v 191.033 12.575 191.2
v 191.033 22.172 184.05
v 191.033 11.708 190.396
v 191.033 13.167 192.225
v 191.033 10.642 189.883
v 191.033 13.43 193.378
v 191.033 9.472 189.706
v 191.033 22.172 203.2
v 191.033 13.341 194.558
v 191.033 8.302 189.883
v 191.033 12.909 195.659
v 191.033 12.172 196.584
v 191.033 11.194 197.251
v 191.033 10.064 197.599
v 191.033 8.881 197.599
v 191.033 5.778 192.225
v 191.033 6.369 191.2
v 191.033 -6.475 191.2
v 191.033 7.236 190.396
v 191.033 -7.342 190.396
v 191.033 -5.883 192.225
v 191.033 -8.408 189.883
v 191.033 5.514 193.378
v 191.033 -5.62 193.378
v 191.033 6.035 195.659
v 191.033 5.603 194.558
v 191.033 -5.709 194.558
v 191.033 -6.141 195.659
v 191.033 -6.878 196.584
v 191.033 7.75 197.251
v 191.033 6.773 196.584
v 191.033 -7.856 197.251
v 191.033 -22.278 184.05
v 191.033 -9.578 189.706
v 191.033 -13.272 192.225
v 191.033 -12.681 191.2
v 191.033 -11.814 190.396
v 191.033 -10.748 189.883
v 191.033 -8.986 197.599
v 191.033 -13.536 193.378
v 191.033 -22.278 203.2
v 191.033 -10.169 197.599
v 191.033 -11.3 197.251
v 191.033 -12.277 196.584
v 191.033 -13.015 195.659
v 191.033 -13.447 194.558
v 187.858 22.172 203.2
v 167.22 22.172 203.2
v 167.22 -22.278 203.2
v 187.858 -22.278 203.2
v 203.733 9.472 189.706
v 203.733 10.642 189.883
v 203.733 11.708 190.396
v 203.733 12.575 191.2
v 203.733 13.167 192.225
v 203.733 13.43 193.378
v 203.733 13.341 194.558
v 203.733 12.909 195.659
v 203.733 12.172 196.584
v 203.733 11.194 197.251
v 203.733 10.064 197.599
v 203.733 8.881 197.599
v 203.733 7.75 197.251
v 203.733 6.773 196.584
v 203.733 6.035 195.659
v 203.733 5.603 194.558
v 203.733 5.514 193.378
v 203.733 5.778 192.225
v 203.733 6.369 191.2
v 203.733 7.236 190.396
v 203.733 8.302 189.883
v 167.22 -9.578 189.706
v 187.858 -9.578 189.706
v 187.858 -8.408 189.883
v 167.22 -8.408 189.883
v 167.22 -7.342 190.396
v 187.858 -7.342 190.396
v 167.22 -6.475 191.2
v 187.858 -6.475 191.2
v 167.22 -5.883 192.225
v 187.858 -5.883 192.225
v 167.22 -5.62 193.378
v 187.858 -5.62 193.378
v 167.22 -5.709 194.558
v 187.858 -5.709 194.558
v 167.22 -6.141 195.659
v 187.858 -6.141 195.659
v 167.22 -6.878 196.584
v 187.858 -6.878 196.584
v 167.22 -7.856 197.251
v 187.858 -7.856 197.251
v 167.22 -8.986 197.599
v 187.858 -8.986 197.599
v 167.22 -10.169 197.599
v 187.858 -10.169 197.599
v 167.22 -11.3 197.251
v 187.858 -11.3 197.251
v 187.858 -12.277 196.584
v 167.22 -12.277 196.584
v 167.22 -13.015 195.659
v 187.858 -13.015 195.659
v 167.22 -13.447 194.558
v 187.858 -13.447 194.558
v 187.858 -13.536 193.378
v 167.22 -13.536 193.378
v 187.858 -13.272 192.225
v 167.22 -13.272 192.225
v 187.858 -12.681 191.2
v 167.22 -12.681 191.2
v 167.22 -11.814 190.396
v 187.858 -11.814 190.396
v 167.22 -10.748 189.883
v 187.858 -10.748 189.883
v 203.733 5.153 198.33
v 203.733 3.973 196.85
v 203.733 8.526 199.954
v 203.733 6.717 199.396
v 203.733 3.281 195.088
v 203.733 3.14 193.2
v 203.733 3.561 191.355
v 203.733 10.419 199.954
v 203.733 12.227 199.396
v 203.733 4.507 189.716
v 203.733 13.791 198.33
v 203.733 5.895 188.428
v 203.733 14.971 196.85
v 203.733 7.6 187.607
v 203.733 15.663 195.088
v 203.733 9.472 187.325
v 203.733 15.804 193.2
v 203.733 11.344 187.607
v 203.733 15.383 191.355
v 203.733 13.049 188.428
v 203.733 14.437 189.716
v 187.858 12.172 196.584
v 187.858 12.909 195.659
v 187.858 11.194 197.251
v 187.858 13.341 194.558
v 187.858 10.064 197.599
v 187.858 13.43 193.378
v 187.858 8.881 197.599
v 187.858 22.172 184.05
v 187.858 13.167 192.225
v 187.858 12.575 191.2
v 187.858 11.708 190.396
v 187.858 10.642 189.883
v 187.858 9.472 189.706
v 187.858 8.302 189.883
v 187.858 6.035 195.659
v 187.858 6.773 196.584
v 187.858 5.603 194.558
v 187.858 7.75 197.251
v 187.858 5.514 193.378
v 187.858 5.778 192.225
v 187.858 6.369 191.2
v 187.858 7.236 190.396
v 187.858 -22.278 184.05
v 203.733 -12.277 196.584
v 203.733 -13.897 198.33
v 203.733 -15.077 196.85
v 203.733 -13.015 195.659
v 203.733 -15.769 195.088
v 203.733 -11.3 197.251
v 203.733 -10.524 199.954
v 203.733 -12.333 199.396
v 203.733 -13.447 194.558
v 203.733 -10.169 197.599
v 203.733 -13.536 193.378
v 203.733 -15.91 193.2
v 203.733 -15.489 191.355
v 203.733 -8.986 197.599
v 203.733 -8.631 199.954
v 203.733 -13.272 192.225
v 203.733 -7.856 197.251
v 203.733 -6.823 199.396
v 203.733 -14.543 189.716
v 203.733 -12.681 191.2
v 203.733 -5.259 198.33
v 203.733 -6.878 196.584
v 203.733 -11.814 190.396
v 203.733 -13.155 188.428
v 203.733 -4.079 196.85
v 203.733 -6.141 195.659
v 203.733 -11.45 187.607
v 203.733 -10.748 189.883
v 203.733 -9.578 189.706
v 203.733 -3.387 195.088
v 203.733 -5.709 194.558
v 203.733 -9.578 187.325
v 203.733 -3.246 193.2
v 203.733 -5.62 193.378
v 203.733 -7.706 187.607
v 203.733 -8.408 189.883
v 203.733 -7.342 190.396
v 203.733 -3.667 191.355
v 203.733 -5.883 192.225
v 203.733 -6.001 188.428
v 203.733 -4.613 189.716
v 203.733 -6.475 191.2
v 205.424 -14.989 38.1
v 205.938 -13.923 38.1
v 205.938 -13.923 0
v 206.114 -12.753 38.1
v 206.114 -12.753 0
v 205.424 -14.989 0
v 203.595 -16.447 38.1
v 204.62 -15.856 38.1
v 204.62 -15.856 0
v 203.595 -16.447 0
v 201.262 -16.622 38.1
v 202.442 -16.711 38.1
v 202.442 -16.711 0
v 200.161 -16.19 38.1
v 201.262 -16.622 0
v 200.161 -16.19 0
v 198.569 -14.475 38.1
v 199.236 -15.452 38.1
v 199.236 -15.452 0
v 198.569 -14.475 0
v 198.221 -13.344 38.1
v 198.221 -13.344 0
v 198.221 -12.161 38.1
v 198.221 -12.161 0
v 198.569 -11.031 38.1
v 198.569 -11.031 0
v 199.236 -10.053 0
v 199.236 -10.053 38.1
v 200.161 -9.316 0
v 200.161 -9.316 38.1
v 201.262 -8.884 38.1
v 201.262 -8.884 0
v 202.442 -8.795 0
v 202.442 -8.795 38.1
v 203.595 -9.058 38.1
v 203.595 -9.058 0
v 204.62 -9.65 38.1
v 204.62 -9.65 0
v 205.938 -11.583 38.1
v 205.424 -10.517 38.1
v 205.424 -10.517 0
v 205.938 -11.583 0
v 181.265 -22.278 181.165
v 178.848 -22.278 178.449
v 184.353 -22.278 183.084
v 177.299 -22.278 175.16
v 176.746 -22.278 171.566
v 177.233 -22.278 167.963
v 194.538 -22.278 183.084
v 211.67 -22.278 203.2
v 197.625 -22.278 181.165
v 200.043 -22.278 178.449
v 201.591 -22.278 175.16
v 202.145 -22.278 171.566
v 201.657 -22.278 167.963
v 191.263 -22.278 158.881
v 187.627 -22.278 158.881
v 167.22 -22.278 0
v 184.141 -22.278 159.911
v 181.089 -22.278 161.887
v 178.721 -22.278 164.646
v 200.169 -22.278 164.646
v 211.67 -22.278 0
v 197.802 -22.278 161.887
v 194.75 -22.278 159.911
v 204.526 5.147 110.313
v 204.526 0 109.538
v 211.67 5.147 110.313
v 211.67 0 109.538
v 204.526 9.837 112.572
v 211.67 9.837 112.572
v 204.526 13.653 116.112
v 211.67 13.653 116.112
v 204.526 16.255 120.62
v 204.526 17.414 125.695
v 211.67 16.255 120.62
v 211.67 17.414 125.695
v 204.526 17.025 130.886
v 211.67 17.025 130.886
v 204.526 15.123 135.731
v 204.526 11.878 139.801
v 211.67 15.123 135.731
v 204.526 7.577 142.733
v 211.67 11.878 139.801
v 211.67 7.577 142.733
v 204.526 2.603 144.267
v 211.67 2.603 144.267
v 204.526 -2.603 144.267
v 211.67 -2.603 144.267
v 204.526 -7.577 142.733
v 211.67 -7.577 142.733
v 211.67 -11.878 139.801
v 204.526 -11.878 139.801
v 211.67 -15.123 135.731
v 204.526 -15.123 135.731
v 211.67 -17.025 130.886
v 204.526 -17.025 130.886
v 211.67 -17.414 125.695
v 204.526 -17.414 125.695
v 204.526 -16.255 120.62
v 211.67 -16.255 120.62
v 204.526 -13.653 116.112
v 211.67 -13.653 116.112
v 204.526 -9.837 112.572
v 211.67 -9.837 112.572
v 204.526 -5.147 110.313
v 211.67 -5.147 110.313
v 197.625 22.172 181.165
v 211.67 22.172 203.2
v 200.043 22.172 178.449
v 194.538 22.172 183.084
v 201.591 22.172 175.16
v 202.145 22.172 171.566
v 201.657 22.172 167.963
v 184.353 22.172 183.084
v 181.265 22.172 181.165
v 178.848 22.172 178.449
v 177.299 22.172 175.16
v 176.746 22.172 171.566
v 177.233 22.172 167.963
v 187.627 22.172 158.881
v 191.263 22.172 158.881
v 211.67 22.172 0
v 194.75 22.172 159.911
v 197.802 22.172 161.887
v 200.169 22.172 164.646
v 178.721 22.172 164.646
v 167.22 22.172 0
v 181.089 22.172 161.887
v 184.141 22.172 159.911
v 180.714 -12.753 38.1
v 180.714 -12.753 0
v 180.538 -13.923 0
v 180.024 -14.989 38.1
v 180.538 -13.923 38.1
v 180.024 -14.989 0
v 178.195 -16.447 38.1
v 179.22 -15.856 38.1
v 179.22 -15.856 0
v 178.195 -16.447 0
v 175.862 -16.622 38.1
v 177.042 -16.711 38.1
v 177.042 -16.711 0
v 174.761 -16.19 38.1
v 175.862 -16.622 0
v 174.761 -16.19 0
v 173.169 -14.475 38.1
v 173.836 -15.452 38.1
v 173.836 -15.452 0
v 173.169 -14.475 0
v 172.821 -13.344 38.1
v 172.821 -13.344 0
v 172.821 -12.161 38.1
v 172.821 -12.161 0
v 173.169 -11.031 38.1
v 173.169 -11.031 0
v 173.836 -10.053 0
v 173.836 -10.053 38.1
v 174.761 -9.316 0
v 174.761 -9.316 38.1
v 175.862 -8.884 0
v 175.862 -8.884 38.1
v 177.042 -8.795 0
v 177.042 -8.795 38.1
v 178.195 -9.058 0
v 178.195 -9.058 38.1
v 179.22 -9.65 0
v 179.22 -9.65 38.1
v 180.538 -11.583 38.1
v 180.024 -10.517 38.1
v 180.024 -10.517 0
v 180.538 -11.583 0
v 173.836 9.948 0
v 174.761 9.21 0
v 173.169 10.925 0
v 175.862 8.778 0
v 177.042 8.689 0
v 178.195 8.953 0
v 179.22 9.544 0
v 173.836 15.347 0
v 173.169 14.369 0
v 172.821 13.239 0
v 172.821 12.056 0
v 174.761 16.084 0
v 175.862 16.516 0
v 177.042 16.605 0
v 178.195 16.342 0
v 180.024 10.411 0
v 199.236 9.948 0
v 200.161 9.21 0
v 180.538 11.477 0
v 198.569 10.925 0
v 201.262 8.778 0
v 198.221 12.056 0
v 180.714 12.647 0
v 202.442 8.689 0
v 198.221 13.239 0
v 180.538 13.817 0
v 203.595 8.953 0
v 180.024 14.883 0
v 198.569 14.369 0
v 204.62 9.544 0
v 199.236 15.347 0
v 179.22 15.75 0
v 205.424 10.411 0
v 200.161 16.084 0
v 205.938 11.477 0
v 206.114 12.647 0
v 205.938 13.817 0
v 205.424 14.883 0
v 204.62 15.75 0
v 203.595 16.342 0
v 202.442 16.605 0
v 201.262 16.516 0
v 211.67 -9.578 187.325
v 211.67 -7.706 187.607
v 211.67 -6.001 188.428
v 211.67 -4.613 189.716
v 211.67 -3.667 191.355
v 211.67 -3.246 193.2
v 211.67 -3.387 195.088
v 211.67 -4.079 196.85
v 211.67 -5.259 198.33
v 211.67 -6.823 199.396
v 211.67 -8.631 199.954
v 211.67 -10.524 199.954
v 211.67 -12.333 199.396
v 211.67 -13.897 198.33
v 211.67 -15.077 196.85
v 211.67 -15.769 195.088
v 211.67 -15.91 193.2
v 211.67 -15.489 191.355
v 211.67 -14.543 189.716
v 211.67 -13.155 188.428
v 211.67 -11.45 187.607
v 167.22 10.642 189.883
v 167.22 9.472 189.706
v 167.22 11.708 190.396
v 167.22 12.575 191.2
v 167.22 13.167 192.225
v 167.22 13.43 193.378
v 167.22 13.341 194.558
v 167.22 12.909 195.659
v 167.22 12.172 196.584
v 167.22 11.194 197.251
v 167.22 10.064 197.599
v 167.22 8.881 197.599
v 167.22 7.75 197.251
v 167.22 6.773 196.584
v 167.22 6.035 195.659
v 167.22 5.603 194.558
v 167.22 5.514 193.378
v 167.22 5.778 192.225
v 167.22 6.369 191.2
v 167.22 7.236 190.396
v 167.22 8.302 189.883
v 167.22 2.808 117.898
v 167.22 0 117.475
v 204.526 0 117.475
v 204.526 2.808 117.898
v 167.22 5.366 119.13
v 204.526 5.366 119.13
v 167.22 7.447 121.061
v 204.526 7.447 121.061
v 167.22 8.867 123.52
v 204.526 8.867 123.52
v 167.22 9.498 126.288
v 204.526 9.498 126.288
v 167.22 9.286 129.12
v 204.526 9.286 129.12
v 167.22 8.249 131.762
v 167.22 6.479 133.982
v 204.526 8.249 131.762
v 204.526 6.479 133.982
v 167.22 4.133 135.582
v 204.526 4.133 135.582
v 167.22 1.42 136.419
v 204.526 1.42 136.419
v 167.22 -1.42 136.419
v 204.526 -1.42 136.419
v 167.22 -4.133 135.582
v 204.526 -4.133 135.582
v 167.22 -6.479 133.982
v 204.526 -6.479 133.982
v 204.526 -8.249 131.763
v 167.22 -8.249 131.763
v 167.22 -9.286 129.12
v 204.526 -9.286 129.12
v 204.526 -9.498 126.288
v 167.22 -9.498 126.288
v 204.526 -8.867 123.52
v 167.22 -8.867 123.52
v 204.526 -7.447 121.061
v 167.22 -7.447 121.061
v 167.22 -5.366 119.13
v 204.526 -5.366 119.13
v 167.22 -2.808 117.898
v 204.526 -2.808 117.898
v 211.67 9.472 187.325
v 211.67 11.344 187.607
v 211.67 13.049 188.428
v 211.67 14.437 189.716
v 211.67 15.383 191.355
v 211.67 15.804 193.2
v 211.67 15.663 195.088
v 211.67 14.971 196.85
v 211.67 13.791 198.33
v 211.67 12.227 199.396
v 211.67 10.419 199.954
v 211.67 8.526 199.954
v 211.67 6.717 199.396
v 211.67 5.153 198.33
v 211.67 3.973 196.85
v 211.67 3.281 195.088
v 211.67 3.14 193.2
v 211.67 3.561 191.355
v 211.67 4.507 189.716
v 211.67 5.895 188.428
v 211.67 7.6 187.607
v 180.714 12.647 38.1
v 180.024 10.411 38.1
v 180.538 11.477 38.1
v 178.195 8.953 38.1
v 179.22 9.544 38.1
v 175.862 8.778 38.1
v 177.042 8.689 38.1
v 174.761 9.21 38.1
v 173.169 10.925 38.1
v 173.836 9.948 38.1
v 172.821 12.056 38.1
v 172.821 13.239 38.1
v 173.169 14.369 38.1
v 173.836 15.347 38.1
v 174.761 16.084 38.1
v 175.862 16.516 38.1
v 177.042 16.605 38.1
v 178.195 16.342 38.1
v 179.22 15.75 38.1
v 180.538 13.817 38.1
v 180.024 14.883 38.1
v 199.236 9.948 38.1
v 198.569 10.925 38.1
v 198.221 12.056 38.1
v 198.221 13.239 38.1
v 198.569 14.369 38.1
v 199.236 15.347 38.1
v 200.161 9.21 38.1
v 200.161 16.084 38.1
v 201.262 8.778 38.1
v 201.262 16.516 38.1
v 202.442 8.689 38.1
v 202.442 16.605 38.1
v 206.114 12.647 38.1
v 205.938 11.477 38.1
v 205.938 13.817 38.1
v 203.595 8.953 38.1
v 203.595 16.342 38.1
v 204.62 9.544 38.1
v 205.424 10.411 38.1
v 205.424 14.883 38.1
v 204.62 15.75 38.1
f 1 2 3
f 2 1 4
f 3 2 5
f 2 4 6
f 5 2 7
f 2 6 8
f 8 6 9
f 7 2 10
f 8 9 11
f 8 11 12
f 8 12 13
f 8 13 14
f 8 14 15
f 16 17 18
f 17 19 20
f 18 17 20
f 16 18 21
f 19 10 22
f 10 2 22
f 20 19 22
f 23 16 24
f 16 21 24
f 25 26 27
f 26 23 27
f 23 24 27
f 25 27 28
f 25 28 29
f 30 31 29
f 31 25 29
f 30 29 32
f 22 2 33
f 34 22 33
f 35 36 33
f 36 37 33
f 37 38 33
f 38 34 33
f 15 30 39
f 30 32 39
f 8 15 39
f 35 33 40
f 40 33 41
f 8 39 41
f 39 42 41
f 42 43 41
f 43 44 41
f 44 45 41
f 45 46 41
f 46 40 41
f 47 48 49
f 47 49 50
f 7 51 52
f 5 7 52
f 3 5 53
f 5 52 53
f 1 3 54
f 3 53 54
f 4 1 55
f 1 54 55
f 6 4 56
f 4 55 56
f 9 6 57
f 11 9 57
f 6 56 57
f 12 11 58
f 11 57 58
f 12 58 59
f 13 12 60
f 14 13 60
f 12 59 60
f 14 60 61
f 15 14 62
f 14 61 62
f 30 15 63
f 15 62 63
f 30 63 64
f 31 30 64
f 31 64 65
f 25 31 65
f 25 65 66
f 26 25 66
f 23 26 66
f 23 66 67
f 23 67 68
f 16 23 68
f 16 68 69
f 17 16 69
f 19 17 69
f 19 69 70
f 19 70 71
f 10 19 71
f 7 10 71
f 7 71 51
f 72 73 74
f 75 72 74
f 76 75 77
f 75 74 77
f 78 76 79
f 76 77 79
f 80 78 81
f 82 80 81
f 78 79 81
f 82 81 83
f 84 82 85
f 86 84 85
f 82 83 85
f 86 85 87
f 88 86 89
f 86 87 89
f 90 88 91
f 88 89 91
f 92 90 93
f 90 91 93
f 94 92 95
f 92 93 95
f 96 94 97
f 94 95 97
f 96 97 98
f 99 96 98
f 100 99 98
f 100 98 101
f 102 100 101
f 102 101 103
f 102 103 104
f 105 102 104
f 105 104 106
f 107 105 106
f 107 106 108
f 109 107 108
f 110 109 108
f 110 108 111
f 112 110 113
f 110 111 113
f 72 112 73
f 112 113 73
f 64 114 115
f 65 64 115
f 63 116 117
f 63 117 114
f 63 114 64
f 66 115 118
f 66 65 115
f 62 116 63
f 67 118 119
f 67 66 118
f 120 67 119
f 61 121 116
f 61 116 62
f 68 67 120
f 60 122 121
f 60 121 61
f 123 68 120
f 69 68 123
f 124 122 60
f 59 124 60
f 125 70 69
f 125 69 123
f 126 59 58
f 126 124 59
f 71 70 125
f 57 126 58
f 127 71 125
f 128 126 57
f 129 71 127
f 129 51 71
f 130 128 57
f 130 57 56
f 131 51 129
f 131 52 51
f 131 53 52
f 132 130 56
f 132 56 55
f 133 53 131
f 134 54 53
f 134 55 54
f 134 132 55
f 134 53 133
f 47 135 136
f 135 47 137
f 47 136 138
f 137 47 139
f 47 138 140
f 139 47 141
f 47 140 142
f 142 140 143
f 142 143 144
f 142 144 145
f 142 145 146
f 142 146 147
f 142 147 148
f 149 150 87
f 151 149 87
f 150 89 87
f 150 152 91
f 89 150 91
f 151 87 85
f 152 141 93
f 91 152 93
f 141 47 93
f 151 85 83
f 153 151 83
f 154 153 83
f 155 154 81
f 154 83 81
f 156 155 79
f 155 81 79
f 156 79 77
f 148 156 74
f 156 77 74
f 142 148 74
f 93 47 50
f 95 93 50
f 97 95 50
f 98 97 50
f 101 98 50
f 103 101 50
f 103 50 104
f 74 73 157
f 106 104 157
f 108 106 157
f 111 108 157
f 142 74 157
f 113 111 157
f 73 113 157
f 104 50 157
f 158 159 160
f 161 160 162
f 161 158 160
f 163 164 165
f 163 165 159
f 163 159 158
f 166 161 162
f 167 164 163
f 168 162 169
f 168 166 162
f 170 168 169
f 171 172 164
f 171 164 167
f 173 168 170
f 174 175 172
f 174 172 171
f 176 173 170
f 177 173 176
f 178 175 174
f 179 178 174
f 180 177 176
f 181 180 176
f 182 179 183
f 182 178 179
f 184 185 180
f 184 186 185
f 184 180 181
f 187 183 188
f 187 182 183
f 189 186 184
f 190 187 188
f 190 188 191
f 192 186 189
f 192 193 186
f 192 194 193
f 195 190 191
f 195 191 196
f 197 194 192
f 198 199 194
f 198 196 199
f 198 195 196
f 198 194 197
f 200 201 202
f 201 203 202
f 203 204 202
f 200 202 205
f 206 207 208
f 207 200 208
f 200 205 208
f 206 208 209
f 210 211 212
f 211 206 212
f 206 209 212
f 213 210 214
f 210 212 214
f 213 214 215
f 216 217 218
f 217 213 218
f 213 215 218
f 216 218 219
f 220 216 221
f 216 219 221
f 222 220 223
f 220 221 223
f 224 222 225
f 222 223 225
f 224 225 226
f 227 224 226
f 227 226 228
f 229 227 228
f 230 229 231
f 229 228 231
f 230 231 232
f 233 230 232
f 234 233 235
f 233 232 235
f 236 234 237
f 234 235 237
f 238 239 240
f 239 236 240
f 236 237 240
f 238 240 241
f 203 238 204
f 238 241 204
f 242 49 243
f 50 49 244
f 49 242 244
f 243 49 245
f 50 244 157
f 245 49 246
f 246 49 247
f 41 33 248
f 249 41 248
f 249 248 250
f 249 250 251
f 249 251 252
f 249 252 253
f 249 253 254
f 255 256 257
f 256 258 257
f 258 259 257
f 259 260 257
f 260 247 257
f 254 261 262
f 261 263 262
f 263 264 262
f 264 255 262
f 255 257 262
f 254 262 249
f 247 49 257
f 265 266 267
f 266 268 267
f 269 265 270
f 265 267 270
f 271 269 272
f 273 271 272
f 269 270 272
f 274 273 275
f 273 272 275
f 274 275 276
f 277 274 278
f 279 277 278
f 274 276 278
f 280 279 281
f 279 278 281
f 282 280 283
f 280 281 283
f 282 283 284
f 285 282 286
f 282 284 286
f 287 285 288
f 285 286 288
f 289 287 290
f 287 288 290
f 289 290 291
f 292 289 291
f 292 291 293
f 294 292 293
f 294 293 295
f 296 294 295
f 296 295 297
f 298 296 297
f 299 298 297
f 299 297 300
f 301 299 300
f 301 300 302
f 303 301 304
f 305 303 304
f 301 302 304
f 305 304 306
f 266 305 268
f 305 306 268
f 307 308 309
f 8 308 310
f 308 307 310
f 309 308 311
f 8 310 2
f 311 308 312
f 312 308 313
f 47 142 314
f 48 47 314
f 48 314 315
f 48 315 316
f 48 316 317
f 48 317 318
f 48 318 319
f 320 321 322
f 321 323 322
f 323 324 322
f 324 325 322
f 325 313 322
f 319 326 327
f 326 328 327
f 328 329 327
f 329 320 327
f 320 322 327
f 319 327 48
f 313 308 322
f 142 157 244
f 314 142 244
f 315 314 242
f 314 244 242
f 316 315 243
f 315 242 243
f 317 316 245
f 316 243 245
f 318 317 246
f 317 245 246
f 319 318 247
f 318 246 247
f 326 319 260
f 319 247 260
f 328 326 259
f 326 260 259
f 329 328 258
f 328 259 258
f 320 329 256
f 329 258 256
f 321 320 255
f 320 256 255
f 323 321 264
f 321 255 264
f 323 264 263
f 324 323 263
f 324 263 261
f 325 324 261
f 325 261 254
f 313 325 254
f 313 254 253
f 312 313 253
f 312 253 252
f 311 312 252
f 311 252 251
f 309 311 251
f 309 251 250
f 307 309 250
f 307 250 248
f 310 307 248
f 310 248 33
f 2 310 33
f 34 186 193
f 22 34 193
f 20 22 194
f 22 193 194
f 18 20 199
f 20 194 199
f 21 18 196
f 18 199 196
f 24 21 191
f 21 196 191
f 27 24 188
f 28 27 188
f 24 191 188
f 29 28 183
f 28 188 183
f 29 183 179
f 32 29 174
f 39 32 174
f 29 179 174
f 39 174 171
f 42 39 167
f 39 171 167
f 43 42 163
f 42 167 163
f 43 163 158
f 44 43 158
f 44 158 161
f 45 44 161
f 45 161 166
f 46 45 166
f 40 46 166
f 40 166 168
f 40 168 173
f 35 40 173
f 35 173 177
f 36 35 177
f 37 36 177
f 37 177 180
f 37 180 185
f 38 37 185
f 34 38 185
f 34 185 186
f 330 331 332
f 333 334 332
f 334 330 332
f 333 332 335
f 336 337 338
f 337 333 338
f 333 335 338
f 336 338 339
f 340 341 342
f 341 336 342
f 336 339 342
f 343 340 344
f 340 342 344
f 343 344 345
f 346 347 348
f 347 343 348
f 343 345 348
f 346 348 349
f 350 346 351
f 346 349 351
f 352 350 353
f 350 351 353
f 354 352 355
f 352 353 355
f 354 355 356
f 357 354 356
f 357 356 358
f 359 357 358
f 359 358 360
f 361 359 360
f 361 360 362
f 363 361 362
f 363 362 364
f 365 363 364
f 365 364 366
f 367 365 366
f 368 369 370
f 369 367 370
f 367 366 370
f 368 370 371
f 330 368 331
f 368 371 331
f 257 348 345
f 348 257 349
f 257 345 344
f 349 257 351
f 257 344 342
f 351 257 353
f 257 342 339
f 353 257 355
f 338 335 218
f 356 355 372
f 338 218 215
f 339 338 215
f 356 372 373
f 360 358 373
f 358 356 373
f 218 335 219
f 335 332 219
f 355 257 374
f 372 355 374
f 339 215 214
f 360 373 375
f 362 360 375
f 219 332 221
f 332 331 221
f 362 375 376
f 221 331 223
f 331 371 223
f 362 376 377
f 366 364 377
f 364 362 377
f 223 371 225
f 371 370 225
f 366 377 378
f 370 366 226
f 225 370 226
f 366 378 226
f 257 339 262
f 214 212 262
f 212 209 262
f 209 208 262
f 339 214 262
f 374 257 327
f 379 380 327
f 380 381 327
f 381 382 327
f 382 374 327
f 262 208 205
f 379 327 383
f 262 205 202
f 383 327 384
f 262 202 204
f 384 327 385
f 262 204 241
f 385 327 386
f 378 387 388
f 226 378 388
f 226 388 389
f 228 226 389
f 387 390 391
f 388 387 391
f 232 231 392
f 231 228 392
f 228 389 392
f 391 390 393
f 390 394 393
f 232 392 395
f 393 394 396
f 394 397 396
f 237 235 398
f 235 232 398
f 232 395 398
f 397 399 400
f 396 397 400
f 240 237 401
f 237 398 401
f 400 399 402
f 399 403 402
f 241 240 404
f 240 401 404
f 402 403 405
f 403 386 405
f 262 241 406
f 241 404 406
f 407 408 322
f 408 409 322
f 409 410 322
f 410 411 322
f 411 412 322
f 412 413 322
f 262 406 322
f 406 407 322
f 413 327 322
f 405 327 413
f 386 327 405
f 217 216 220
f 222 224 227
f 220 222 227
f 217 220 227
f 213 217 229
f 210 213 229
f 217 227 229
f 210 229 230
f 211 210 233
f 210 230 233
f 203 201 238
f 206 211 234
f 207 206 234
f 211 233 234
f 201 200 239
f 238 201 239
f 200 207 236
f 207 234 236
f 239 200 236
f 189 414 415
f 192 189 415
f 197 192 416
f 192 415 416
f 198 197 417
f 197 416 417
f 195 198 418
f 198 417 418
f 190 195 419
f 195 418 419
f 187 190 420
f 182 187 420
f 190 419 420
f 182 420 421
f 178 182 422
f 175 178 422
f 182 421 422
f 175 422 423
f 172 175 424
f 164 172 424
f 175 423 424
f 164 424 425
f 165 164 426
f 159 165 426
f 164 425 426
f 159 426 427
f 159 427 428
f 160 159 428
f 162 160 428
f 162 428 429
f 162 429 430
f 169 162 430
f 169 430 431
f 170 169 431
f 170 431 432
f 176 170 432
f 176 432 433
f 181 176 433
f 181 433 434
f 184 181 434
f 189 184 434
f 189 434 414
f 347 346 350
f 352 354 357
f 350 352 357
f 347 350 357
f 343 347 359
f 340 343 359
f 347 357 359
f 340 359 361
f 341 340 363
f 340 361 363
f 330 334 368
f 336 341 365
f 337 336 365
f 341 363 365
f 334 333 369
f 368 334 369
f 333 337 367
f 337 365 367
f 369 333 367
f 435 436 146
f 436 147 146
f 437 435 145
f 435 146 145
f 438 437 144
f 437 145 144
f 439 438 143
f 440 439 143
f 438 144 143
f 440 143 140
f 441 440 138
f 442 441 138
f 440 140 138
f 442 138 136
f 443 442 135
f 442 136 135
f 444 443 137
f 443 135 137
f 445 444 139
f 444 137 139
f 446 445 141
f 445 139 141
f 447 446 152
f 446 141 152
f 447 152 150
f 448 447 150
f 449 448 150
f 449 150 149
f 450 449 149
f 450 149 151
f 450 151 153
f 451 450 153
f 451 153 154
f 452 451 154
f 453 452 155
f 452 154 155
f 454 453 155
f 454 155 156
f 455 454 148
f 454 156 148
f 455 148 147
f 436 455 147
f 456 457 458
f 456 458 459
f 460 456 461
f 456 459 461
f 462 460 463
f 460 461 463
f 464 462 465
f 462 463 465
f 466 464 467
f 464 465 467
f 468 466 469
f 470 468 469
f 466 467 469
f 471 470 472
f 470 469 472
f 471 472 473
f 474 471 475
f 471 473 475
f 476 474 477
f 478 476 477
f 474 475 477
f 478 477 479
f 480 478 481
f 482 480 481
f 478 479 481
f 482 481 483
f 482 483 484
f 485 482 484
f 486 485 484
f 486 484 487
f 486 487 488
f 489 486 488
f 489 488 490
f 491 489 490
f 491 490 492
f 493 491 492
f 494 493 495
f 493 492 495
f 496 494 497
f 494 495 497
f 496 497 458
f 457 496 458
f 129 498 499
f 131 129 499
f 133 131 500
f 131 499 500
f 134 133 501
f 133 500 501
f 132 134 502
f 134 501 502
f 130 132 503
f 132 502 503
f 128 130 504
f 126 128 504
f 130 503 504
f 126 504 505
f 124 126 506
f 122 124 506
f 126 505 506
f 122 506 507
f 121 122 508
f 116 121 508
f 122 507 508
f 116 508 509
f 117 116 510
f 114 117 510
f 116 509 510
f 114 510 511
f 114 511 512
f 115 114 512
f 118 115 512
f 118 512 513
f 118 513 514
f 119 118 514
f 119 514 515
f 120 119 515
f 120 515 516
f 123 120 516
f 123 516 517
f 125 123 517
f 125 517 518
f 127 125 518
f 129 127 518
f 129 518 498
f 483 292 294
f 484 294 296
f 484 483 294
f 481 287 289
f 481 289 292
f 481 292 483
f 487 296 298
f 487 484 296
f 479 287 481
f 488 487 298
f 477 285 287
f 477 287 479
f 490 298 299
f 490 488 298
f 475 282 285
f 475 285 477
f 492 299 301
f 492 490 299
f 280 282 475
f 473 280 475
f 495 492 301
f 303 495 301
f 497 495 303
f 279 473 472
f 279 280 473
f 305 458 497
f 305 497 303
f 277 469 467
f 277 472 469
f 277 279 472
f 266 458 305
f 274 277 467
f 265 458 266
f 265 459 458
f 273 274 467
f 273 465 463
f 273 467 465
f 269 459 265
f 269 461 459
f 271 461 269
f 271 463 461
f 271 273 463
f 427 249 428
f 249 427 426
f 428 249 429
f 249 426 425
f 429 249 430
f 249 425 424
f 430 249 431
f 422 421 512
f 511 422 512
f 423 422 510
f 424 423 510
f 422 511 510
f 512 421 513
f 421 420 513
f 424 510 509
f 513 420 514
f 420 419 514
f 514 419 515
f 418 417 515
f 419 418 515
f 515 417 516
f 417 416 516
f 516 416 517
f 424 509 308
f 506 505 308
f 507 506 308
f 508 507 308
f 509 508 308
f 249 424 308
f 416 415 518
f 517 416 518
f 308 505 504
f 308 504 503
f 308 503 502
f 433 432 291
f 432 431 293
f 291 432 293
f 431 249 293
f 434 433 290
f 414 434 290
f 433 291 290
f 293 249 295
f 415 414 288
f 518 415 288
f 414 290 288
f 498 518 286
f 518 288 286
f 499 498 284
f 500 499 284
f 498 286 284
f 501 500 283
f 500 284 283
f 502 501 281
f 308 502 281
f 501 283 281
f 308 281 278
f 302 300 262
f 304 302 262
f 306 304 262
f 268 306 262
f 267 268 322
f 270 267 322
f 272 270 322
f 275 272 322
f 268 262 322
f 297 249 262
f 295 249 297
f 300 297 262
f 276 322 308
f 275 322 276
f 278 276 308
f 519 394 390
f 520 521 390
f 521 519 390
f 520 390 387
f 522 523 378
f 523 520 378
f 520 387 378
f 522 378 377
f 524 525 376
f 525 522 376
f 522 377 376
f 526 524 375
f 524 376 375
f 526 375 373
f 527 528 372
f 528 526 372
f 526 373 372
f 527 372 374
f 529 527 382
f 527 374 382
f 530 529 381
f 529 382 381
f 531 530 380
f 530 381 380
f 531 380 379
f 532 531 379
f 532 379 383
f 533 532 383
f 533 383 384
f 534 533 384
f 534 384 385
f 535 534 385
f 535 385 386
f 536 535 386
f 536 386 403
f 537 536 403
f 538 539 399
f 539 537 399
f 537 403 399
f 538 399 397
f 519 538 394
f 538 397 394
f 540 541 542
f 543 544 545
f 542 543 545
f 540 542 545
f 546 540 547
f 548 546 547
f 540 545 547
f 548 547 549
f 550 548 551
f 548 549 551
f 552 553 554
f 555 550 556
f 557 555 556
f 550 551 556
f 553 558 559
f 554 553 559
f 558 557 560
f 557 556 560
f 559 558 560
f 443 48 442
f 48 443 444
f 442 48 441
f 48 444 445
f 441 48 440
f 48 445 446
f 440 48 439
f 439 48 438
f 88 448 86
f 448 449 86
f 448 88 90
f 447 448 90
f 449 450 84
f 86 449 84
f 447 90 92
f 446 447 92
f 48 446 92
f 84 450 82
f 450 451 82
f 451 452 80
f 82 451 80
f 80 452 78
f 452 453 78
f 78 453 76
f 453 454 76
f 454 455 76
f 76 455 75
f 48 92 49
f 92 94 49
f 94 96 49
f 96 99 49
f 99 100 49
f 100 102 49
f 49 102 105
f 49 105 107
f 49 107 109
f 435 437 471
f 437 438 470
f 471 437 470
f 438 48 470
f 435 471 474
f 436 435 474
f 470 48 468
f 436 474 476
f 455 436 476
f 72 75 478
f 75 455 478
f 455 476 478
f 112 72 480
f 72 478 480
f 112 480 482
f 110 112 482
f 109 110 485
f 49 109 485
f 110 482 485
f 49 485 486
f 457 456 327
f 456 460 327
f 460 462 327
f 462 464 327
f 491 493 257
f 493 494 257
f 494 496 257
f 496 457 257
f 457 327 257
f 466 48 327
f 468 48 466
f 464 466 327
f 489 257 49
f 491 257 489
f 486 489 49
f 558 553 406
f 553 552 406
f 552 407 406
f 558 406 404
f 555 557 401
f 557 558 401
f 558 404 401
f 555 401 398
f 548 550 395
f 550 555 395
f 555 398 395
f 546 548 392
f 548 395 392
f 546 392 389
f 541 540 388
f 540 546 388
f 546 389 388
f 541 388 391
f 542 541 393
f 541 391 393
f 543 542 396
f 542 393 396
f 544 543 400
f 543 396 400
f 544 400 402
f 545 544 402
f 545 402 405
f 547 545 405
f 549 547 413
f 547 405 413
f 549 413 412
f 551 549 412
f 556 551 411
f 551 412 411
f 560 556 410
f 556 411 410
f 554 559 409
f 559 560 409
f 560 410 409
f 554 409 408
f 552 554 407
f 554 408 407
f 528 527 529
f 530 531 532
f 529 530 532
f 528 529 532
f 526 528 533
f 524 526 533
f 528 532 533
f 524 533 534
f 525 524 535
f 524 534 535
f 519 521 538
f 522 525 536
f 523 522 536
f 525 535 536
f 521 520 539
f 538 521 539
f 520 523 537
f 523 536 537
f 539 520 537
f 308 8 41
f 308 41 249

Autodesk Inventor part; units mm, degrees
ref_plane "YZ Plane" through (0, 0, 0) normal (1, 0, 0) x (0, 1, 0)
ref_plane "XZ Plane" through (0, 0, 0) normal (0, 1, 0) x (-1, 0, 0)
ref_plane "XY Plane" through (0, 0, 0) normal (0, 0, 1) x (1, 0, 0)
sketch "Sketch1" plane through (0, 0, 0) normal (0, 0, 1) x (1, 0, 0)
  circle A0 centre (202.1451, 12.6471) radius 3.9688 projected
  circle A1 centre (202.1451, -12.7529) radius 3.9688 projected
  circle A2 centre (176.7451, 12.6471) radius 3.9688 projected
  circle A3 centre (176.7451, -12.7529) radius 3.9688 projected
  line L0 (211.6701, 22.1721) -> (167.2201, 22.1721)
  line L1 (167.2201, 22.1721) -> (167.2201, -22.2779)
  line L2 (167.2201, -22.2779) -> (211.6701, -22.2779)
  line L3 (211.6701, -22.2779) -> (211.6701, 22.1721)
  point P0 (0, 0)
  dimension "d0" = 9.525
  dimension "d1" = 9.525
  dimension "d2" = 44.45
  dimension "d3" = 44.45
extrude "Extrusion1" add sketch "Sketch1" along normal blind 38.1
sketch "Sketch2" plane through (0, 0, 38.1) normal (0, 0, 1) x (1, 0, 0)
  line L0 (211.6701, -22.2779) -> (211.6701, 22.1721) projected
  line L1 (167.2201, 22.1721) -> (167.2201, -22.2779) projected
  line L2 (211.6701, 22.1721) -> (167.2201, 22.1721)
  line L3 (167.2201, 22.1721) -> (167.2201, -22.2779)
  line L4 (167.2201, -22.2779) -> (211.6701, -22.2779)
  line L5 (211.6701, -22.2779) -> (211.6701, 22.1721)
  point P0 (0, 0)
extrude "Extrusion2" add sketch "Sketch2" along normal blind 165.1
sketch "Sketch3" plane through (167.2201, -22.2779, 0) normal (-1, 0, 0) x (0, 0, 1)
  point P0 (0, 22.2779)
sketch "Sketch4" plane through (211.6701, -22.2779, 0) normal (1, 0, 0) x (0, 0, -1)
  circle A0 centre (-127, 22.2779) radius 17.4625
  point P0 (0, 22.2779)
  dimension "d8" = 34.925
  dimension "d11" = 127
extrude "Extrusion3" cut sketch "Sketch4" against normal blind 7.1437
sketch "Sketch5" plane through (204.5263, 0, 127) normal (1, 0, 0) x (0, 0, -1)
  circle A0 centre (0, 0) radius 9.525
  point P0 (127, 0)
  dimension "d12" = 19.05
extrude "Extrusion4" cut sketch "Sketch5" against normal blind 50.8
sketch "Sketch6" plane through (167.2201, -22.2779, 0) normal (0, -1, 0) x (1, 0, 0)
  circle A0 centre (22.225, 171.45) radius 12.7
  line L0 (0, 203.2) -> (44.45, 203.2) projected
  point P0 (-167.2201, 0)
  dimension "d15" = 25.4
  dimension "d16" = 31.75
extrude "Extrusion5" cut sketch "Sketch6" against normal blind 50.8
sketch "Sketch7" plane through (167.2201, -22.2779, 0) normal (0, -1, 0) x (1, 0, 0)
  line L0 (44.45, 203.2) -> (0, 203.2) projected
  line L1 (23.8125, 203.2) -> (20.6375, 203.2)
  line L2 (20.6375, 203.2) -> (20.6375, 177.8)
  line L3 (20.6375, 177.8) -> (23.8125, 177.8)
  line L4 (23.8125, 177.8) -> (23.8125, 203.2)
  line L5 (44.45, 0) -> (44.45, 203.2) projected
  point P0 (-167.2201, 0)
  dimension "d19" = 3.175
  dimension "d20" = 20.6375
  dimension "d21" = 25.4
extrude "Extrusion6" cut sketch "Sketch7" against normal blind 50.8
sketch "Sketch8" plane through (211.6701, -22.2779, 0) normal (1, 0, 0) x (0, 0, -1)
  circle A0 centre (-193.675, 31.75) radius 6.35
  line L0 (-203.2, 0) -> (-203.2, 44.45) projected
  circle A1 centre (-193.675, 12.7) radius 6.35
  line L1 (0, 44.45) -> (-203.2, 44.45) projected
  line L2 (0, 0) -> (-203.2, 0) projected
  point P0 (0, 22.2779)
  dimension "d24" = 12.7
  dimension "d25" = 9.525
  dimension "d26" = 12.7
  dimension "d27" = 12.7
  dimension "d28" = 12.7
extrude "Extrusion7" cut sketch "Sketch8" against normal blind 7.9375
sketch "Sketch9" plane through (203.7326, 9.4721, 193.675) normal (1, 0, 0) x (0, 0, -1)
  circle A0 centre (0, 0) radius 6.35 projected
  circle A1 centre (0, 0) radius 3.9688
  circle A2 centre (0, -19.05) radius 6.35 projected
  circle A3 centre (0, -19.05) radius 3.9688
  point P0 (193.675, -9.4721)
  dimension "d31" = 7.9375
  dimension "d32" = 7.9375
extrude "Extrusion8" cut sketch "Sketch9" against normal blind 38.1 contours A1 | A3
properties part number "Corner Stand"
